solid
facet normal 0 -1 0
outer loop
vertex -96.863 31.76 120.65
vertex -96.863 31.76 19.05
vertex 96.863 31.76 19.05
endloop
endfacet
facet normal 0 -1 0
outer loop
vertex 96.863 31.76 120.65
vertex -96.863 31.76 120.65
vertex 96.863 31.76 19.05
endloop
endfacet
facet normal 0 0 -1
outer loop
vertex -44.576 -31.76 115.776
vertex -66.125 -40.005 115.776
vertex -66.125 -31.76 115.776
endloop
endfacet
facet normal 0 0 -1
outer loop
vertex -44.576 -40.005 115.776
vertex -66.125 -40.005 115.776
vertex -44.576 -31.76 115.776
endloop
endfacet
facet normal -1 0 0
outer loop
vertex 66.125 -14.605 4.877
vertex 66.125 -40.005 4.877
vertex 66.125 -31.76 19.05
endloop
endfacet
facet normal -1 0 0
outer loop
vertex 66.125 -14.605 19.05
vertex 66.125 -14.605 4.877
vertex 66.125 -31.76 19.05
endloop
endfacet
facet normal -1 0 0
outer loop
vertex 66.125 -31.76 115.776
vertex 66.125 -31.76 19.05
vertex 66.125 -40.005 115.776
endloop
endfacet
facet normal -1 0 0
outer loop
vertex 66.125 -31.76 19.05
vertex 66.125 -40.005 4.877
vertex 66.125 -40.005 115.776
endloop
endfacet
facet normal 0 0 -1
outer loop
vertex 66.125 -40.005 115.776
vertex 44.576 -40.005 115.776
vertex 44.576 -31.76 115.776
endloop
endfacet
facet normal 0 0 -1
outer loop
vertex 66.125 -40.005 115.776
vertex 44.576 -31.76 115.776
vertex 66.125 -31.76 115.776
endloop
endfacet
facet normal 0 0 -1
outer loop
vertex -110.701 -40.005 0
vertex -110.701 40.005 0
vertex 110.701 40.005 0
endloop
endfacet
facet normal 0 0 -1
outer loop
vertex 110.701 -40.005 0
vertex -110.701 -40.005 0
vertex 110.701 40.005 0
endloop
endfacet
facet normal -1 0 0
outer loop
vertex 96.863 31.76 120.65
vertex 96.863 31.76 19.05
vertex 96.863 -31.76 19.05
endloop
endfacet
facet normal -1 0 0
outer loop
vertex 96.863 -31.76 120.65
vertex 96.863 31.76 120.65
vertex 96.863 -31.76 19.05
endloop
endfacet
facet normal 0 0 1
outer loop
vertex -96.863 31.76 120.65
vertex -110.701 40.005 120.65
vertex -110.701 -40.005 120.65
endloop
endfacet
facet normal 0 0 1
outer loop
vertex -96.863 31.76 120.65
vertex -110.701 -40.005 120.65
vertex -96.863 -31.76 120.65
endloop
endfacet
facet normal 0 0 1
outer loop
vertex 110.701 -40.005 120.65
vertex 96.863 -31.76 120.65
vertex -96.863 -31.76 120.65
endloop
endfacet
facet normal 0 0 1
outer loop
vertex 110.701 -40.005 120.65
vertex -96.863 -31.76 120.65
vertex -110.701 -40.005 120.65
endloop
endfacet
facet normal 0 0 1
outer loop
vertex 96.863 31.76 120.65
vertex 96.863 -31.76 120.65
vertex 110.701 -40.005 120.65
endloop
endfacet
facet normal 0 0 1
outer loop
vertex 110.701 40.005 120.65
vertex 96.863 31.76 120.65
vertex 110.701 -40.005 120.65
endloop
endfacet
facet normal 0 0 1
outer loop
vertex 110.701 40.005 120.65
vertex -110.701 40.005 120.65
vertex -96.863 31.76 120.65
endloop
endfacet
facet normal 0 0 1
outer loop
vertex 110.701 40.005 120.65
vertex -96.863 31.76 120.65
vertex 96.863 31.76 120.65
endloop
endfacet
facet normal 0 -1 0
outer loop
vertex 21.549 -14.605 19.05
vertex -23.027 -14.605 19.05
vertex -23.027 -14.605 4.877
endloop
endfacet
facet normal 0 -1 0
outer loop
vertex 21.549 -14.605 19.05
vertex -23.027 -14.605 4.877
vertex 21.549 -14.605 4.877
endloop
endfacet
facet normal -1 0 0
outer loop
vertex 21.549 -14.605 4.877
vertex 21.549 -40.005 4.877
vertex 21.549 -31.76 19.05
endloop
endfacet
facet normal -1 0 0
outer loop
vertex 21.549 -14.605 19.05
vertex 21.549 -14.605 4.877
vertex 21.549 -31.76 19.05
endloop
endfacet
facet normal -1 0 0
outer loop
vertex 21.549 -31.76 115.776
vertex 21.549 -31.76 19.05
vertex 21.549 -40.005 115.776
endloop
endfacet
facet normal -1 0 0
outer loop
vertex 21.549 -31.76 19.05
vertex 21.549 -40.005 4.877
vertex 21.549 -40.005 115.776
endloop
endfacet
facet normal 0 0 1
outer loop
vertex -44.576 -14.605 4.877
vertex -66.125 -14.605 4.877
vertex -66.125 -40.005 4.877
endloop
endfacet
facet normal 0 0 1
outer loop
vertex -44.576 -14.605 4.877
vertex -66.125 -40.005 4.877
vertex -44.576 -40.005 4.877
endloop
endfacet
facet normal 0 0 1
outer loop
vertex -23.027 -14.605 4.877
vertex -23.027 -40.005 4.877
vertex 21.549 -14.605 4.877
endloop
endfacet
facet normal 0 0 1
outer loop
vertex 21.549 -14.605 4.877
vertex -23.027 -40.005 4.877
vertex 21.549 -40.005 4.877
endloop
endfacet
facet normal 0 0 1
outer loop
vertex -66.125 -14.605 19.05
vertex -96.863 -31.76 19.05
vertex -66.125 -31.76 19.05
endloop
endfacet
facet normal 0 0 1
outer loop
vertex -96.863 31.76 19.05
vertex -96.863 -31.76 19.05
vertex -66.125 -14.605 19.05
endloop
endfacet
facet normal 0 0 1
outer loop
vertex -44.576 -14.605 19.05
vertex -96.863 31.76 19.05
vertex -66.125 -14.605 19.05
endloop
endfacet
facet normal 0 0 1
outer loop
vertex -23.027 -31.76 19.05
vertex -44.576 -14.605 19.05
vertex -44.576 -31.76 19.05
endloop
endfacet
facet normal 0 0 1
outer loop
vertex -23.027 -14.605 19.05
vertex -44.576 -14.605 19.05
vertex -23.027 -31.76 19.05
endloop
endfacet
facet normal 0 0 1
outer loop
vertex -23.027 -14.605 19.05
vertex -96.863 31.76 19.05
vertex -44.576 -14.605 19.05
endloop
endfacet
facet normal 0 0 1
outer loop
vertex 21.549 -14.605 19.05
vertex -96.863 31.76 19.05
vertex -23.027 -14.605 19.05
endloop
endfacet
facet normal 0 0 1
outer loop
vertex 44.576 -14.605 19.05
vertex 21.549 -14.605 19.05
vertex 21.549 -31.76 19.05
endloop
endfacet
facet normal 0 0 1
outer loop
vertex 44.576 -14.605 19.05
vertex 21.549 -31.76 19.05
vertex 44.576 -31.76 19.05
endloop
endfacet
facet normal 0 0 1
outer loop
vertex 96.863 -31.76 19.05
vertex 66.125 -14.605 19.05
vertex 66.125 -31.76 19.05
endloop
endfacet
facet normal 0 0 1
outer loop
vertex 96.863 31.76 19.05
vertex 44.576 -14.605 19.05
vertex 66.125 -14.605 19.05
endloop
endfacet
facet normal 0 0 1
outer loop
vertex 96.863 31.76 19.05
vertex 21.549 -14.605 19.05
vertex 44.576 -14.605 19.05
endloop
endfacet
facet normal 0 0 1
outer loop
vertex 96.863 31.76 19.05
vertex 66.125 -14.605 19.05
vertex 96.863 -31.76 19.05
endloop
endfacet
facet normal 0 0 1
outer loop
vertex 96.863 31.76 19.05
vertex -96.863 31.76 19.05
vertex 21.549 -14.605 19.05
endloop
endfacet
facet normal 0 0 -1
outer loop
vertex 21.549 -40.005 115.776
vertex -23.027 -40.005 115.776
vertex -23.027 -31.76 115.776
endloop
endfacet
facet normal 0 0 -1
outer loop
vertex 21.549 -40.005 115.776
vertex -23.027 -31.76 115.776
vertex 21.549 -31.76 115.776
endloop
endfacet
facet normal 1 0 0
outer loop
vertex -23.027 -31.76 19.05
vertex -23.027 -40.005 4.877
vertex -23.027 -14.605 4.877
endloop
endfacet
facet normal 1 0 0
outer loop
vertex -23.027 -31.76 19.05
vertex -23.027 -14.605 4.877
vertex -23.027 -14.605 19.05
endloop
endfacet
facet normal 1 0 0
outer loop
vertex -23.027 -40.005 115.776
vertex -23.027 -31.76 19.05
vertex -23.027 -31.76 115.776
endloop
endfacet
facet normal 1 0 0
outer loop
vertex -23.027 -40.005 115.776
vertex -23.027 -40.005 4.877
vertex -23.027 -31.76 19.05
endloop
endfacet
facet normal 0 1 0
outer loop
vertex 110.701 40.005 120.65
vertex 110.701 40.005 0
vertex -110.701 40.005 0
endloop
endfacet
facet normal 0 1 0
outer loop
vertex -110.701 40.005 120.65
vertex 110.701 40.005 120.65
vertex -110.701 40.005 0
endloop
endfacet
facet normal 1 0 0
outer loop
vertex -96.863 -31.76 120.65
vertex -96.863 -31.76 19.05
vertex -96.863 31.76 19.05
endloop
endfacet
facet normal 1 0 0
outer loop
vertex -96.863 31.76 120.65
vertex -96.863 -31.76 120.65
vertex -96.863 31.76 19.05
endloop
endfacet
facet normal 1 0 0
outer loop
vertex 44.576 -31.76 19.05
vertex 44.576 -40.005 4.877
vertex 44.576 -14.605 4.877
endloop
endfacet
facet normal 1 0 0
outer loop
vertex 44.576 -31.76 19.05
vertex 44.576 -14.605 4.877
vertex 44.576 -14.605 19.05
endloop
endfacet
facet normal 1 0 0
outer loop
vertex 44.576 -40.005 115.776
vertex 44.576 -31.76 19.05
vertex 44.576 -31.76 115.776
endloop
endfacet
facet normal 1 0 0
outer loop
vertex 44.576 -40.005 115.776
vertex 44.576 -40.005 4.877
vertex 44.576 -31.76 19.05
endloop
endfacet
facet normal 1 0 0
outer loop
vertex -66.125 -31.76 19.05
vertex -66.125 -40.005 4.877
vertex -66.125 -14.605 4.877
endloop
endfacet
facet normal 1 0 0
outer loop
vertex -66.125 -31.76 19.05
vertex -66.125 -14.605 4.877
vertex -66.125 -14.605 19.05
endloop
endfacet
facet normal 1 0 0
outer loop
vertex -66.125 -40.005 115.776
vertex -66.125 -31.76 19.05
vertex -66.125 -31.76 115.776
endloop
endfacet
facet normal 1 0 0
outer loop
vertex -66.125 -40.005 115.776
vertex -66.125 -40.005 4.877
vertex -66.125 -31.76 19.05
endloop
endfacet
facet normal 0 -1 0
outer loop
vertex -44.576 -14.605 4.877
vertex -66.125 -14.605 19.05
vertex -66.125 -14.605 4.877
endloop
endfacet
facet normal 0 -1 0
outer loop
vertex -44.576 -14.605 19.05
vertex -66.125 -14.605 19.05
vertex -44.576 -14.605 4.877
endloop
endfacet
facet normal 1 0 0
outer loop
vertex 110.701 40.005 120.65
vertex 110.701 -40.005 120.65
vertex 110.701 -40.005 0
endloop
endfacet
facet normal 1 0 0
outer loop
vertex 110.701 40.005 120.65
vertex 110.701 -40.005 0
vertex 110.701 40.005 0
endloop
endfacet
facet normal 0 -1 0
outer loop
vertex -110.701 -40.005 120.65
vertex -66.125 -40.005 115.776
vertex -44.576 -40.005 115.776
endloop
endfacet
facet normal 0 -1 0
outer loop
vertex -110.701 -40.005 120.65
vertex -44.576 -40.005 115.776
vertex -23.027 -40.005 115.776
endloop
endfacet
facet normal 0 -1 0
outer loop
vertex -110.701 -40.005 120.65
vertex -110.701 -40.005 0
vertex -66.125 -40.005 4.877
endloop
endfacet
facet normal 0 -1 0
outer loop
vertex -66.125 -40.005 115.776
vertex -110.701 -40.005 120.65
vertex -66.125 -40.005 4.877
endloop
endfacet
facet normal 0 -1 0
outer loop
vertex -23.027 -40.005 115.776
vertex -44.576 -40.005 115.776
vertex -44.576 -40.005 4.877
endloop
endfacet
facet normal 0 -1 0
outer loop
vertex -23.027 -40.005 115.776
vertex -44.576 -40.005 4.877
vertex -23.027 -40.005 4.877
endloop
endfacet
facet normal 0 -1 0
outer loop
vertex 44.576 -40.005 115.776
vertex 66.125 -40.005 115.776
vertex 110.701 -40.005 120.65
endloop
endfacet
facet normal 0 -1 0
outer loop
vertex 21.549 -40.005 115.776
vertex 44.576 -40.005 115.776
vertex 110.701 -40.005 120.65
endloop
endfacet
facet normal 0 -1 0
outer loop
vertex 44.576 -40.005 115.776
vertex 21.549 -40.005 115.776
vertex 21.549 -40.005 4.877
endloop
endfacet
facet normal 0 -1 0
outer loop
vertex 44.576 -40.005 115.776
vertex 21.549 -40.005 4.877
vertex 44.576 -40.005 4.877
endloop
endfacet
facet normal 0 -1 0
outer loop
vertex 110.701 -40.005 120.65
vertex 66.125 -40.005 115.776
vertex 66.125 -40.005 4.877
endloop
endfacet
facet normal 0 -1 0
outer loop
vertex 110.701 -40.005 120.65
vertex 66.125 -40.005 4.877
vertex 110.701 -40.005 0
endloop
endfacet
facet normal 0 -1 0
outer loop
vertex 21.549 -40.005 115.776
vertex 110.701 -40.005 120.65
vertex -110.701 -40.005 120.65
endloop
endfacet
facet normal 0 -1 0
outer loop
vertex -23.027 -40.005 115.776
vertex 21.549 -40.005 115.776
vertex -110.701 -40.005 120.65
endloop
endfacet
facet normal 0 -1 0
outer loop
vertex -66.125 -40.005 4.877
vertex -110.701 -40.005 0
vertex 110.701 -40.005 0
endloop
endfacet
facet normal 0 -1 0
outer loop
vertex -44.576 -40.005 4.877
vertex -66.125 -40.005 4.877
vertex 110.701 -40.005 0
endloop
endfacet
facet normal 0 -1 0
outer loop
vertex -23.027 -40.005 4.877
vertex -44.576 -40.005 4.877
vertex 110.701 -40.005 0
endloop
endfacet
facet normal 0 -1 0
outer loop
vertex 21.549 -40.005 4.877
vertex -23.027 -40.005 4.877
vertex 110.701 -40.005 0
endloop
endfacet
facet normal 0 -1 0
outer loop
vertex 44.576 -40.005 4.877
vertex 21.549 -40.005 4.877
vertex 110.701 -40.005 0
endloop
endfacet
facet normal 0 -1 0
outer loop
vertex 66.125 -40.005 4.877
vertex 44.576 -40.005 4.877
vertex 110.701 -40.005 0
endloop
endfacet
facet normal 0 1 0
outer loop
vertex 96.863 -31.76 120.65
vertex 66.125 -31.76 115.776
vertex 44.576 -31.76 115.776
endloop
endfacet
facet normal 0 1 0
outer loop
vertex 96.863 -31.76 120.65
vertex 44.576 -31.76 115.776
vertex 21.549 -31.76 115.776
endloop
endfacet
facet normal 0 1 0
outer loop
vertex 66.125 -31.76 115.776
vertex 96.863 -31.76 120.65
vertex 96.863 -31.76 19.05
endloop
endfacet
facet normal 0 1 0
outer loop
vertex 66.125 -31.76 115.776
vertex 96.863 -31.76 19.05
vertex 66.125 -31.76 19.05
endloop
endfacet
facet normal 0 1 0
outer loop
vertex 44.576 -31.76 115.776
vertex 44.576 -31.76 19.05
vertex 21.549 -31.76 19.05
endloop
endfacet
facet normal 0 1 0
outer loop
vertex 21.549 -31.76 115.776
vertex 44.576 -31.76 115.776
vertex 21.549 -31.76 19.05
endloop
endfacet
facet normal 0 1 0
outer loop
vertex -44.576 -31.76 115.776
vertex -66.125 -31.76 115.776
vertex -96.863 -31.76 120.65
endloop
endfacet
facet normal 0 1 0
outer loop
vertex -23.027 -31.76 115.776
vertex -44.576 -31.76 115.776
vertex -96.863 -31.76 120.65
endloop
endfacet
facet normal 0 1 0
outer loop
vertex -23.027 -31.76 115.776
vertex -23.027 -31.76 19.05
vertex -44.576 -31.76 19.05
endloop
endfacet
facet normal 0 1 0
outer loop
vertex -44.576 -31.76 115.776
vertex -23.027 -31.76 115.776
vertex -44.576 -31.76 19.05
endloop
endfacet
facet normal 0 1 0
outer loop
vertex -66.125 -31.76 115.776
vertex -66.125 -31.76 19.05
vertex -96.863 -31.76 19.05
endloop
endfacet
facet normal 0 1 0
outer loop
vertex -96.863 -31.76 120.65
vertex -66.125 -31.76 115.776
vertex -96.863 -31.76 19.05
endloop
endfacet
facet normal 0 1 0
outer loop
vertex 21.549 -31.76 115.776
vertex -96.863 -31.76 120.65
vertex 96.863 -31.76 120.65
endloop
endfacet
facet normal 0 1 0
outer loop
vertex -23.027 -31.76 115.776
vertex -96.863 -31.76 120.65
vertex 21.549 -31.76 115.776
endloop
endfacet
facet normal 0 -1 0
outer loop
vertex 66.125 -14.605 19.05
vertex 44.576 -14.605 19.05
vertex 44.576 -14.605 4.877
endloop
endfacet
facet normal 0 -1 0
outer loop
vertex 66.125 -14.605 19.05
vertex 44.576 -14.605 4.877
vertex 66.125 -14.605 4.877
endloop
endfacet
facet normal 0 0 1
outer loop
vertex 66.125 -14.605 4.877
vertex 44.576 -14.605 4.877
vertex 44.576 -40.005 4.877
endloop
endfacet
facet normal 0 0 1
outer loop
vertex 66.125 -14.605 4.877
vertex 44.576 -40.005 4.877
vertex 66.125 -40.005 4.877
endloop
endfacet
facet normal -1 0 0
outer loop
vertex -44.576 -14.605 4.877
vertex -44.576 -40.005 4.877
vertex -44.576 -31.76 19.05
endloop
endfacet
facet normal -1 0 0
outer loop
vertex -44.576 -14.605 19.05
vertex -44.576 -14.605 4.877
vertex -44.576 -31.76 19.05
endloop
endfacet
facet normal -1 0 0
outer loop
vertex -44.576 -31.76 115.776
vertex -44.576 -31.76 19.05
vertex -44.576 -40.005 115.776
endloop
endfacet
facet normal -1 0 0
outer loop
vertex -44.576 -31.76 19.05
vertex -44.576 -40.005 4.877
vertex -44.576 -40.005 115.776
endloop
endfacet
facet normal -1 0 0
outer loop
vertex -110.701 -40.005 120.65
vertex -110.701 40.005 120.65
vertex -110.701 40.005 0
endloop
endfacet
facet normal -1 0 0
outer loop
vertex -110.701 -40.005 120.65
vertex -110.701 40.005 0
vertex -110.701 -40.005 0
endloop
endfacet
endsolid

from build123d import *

# Parameters (mm, degrees)
F0_W     = 221.4017361403
F0_H     = 80.0100043416
F1_DEPTH = 19.05
F2_W     = 193.7265191227
F2_H     = 8.2453042269
F2_W_2   = 38.5067253374
F2_W_3   = 28.581820894
F2_W_4   = 19.8498088866
F3_DEPTH = 101.6
F4_W     = 21.5490460396
F4_H     = 110.8987255699
F4_W_2   = 44.5759110153
F5_DEPTH = 25.4


with BuildPart() as f1:
    # F0 (on Top) → F1 (new body)
    with BuildSketch(Plane.XY):
        Rectangle(F0_W, F0_H)
    extrude(amount=F1_DEPTH)

    # F2 (on face) → F3 (join)
    with BuildSketch(Plane.XY.offset(19.05)):
        Polygon((-96.8632595614, 31.7596979439), (-96.8632595614, 40.0050021708), (-110.7008680701, 40.0050021708), (-110.7008680701, -40.0050021708), (-96.8632595614, -40.0050021708), (-96.8632595614, -31.7596979439), align=None)
        with Locations((0, 35.8823500574)):
            Rectangle(F2_W, F2_H)
        Polygon((110.7008680701, 40.0050021708), (96.8632595614, 40.0050021708), (96.8632595614, 31.7596979439), (96.8632595614, -31.7596979439), (96.8632595614, -40.0050021708), (110.7008680701, -40.0050021708), align=None)
        with Locations((29.178267112, -35.8823500574)):
            Rectangle(F2_W_2, F2_H)
        with Locations((-29.178267112, -35.8823500574)):
            Rectangle(F2_W_2, F2_H)
        with Locations((-82.5723491143, -35.8823500574)):
            Rectangle(F2_W_3, F2_H)
        with Locations((-58.356534224, -35.8823500574)):
            Rectangle(F2_W_4, F2_H)
        with Locations((0, -35.8823500574)):
            Rectangle(F2_W_4, F2_H)
        with Locations((58.356534224, -35.8823500574)):
            Rectangle(F2_W_4, F2_H)
        with Locations((82.5723491143, -35.8823500574)):
            Rectangle(F2_W_3, F2_H)
    extrude(amount=F3_DEPTH)

    # F4 (on face) → F5 (cut)
    with BuildSketch(Plane.XZ.offset(40.0050021708)):
        with Locations((-55.3504340351, 60.326162785)):
            Rectangle(F4_W, F4_H)
        with Locations((-0.7389094681, 60.326162785)):
            Rectangle(F4_W_2, F4_H)
        with Locations((55.3504340351, 60.326162785)):
            Rectangle(F4_W, F4_H)
    extrude(amount=-F5_DEPTH, mode=Mode.SUBTRACT)


solid = f1.part
